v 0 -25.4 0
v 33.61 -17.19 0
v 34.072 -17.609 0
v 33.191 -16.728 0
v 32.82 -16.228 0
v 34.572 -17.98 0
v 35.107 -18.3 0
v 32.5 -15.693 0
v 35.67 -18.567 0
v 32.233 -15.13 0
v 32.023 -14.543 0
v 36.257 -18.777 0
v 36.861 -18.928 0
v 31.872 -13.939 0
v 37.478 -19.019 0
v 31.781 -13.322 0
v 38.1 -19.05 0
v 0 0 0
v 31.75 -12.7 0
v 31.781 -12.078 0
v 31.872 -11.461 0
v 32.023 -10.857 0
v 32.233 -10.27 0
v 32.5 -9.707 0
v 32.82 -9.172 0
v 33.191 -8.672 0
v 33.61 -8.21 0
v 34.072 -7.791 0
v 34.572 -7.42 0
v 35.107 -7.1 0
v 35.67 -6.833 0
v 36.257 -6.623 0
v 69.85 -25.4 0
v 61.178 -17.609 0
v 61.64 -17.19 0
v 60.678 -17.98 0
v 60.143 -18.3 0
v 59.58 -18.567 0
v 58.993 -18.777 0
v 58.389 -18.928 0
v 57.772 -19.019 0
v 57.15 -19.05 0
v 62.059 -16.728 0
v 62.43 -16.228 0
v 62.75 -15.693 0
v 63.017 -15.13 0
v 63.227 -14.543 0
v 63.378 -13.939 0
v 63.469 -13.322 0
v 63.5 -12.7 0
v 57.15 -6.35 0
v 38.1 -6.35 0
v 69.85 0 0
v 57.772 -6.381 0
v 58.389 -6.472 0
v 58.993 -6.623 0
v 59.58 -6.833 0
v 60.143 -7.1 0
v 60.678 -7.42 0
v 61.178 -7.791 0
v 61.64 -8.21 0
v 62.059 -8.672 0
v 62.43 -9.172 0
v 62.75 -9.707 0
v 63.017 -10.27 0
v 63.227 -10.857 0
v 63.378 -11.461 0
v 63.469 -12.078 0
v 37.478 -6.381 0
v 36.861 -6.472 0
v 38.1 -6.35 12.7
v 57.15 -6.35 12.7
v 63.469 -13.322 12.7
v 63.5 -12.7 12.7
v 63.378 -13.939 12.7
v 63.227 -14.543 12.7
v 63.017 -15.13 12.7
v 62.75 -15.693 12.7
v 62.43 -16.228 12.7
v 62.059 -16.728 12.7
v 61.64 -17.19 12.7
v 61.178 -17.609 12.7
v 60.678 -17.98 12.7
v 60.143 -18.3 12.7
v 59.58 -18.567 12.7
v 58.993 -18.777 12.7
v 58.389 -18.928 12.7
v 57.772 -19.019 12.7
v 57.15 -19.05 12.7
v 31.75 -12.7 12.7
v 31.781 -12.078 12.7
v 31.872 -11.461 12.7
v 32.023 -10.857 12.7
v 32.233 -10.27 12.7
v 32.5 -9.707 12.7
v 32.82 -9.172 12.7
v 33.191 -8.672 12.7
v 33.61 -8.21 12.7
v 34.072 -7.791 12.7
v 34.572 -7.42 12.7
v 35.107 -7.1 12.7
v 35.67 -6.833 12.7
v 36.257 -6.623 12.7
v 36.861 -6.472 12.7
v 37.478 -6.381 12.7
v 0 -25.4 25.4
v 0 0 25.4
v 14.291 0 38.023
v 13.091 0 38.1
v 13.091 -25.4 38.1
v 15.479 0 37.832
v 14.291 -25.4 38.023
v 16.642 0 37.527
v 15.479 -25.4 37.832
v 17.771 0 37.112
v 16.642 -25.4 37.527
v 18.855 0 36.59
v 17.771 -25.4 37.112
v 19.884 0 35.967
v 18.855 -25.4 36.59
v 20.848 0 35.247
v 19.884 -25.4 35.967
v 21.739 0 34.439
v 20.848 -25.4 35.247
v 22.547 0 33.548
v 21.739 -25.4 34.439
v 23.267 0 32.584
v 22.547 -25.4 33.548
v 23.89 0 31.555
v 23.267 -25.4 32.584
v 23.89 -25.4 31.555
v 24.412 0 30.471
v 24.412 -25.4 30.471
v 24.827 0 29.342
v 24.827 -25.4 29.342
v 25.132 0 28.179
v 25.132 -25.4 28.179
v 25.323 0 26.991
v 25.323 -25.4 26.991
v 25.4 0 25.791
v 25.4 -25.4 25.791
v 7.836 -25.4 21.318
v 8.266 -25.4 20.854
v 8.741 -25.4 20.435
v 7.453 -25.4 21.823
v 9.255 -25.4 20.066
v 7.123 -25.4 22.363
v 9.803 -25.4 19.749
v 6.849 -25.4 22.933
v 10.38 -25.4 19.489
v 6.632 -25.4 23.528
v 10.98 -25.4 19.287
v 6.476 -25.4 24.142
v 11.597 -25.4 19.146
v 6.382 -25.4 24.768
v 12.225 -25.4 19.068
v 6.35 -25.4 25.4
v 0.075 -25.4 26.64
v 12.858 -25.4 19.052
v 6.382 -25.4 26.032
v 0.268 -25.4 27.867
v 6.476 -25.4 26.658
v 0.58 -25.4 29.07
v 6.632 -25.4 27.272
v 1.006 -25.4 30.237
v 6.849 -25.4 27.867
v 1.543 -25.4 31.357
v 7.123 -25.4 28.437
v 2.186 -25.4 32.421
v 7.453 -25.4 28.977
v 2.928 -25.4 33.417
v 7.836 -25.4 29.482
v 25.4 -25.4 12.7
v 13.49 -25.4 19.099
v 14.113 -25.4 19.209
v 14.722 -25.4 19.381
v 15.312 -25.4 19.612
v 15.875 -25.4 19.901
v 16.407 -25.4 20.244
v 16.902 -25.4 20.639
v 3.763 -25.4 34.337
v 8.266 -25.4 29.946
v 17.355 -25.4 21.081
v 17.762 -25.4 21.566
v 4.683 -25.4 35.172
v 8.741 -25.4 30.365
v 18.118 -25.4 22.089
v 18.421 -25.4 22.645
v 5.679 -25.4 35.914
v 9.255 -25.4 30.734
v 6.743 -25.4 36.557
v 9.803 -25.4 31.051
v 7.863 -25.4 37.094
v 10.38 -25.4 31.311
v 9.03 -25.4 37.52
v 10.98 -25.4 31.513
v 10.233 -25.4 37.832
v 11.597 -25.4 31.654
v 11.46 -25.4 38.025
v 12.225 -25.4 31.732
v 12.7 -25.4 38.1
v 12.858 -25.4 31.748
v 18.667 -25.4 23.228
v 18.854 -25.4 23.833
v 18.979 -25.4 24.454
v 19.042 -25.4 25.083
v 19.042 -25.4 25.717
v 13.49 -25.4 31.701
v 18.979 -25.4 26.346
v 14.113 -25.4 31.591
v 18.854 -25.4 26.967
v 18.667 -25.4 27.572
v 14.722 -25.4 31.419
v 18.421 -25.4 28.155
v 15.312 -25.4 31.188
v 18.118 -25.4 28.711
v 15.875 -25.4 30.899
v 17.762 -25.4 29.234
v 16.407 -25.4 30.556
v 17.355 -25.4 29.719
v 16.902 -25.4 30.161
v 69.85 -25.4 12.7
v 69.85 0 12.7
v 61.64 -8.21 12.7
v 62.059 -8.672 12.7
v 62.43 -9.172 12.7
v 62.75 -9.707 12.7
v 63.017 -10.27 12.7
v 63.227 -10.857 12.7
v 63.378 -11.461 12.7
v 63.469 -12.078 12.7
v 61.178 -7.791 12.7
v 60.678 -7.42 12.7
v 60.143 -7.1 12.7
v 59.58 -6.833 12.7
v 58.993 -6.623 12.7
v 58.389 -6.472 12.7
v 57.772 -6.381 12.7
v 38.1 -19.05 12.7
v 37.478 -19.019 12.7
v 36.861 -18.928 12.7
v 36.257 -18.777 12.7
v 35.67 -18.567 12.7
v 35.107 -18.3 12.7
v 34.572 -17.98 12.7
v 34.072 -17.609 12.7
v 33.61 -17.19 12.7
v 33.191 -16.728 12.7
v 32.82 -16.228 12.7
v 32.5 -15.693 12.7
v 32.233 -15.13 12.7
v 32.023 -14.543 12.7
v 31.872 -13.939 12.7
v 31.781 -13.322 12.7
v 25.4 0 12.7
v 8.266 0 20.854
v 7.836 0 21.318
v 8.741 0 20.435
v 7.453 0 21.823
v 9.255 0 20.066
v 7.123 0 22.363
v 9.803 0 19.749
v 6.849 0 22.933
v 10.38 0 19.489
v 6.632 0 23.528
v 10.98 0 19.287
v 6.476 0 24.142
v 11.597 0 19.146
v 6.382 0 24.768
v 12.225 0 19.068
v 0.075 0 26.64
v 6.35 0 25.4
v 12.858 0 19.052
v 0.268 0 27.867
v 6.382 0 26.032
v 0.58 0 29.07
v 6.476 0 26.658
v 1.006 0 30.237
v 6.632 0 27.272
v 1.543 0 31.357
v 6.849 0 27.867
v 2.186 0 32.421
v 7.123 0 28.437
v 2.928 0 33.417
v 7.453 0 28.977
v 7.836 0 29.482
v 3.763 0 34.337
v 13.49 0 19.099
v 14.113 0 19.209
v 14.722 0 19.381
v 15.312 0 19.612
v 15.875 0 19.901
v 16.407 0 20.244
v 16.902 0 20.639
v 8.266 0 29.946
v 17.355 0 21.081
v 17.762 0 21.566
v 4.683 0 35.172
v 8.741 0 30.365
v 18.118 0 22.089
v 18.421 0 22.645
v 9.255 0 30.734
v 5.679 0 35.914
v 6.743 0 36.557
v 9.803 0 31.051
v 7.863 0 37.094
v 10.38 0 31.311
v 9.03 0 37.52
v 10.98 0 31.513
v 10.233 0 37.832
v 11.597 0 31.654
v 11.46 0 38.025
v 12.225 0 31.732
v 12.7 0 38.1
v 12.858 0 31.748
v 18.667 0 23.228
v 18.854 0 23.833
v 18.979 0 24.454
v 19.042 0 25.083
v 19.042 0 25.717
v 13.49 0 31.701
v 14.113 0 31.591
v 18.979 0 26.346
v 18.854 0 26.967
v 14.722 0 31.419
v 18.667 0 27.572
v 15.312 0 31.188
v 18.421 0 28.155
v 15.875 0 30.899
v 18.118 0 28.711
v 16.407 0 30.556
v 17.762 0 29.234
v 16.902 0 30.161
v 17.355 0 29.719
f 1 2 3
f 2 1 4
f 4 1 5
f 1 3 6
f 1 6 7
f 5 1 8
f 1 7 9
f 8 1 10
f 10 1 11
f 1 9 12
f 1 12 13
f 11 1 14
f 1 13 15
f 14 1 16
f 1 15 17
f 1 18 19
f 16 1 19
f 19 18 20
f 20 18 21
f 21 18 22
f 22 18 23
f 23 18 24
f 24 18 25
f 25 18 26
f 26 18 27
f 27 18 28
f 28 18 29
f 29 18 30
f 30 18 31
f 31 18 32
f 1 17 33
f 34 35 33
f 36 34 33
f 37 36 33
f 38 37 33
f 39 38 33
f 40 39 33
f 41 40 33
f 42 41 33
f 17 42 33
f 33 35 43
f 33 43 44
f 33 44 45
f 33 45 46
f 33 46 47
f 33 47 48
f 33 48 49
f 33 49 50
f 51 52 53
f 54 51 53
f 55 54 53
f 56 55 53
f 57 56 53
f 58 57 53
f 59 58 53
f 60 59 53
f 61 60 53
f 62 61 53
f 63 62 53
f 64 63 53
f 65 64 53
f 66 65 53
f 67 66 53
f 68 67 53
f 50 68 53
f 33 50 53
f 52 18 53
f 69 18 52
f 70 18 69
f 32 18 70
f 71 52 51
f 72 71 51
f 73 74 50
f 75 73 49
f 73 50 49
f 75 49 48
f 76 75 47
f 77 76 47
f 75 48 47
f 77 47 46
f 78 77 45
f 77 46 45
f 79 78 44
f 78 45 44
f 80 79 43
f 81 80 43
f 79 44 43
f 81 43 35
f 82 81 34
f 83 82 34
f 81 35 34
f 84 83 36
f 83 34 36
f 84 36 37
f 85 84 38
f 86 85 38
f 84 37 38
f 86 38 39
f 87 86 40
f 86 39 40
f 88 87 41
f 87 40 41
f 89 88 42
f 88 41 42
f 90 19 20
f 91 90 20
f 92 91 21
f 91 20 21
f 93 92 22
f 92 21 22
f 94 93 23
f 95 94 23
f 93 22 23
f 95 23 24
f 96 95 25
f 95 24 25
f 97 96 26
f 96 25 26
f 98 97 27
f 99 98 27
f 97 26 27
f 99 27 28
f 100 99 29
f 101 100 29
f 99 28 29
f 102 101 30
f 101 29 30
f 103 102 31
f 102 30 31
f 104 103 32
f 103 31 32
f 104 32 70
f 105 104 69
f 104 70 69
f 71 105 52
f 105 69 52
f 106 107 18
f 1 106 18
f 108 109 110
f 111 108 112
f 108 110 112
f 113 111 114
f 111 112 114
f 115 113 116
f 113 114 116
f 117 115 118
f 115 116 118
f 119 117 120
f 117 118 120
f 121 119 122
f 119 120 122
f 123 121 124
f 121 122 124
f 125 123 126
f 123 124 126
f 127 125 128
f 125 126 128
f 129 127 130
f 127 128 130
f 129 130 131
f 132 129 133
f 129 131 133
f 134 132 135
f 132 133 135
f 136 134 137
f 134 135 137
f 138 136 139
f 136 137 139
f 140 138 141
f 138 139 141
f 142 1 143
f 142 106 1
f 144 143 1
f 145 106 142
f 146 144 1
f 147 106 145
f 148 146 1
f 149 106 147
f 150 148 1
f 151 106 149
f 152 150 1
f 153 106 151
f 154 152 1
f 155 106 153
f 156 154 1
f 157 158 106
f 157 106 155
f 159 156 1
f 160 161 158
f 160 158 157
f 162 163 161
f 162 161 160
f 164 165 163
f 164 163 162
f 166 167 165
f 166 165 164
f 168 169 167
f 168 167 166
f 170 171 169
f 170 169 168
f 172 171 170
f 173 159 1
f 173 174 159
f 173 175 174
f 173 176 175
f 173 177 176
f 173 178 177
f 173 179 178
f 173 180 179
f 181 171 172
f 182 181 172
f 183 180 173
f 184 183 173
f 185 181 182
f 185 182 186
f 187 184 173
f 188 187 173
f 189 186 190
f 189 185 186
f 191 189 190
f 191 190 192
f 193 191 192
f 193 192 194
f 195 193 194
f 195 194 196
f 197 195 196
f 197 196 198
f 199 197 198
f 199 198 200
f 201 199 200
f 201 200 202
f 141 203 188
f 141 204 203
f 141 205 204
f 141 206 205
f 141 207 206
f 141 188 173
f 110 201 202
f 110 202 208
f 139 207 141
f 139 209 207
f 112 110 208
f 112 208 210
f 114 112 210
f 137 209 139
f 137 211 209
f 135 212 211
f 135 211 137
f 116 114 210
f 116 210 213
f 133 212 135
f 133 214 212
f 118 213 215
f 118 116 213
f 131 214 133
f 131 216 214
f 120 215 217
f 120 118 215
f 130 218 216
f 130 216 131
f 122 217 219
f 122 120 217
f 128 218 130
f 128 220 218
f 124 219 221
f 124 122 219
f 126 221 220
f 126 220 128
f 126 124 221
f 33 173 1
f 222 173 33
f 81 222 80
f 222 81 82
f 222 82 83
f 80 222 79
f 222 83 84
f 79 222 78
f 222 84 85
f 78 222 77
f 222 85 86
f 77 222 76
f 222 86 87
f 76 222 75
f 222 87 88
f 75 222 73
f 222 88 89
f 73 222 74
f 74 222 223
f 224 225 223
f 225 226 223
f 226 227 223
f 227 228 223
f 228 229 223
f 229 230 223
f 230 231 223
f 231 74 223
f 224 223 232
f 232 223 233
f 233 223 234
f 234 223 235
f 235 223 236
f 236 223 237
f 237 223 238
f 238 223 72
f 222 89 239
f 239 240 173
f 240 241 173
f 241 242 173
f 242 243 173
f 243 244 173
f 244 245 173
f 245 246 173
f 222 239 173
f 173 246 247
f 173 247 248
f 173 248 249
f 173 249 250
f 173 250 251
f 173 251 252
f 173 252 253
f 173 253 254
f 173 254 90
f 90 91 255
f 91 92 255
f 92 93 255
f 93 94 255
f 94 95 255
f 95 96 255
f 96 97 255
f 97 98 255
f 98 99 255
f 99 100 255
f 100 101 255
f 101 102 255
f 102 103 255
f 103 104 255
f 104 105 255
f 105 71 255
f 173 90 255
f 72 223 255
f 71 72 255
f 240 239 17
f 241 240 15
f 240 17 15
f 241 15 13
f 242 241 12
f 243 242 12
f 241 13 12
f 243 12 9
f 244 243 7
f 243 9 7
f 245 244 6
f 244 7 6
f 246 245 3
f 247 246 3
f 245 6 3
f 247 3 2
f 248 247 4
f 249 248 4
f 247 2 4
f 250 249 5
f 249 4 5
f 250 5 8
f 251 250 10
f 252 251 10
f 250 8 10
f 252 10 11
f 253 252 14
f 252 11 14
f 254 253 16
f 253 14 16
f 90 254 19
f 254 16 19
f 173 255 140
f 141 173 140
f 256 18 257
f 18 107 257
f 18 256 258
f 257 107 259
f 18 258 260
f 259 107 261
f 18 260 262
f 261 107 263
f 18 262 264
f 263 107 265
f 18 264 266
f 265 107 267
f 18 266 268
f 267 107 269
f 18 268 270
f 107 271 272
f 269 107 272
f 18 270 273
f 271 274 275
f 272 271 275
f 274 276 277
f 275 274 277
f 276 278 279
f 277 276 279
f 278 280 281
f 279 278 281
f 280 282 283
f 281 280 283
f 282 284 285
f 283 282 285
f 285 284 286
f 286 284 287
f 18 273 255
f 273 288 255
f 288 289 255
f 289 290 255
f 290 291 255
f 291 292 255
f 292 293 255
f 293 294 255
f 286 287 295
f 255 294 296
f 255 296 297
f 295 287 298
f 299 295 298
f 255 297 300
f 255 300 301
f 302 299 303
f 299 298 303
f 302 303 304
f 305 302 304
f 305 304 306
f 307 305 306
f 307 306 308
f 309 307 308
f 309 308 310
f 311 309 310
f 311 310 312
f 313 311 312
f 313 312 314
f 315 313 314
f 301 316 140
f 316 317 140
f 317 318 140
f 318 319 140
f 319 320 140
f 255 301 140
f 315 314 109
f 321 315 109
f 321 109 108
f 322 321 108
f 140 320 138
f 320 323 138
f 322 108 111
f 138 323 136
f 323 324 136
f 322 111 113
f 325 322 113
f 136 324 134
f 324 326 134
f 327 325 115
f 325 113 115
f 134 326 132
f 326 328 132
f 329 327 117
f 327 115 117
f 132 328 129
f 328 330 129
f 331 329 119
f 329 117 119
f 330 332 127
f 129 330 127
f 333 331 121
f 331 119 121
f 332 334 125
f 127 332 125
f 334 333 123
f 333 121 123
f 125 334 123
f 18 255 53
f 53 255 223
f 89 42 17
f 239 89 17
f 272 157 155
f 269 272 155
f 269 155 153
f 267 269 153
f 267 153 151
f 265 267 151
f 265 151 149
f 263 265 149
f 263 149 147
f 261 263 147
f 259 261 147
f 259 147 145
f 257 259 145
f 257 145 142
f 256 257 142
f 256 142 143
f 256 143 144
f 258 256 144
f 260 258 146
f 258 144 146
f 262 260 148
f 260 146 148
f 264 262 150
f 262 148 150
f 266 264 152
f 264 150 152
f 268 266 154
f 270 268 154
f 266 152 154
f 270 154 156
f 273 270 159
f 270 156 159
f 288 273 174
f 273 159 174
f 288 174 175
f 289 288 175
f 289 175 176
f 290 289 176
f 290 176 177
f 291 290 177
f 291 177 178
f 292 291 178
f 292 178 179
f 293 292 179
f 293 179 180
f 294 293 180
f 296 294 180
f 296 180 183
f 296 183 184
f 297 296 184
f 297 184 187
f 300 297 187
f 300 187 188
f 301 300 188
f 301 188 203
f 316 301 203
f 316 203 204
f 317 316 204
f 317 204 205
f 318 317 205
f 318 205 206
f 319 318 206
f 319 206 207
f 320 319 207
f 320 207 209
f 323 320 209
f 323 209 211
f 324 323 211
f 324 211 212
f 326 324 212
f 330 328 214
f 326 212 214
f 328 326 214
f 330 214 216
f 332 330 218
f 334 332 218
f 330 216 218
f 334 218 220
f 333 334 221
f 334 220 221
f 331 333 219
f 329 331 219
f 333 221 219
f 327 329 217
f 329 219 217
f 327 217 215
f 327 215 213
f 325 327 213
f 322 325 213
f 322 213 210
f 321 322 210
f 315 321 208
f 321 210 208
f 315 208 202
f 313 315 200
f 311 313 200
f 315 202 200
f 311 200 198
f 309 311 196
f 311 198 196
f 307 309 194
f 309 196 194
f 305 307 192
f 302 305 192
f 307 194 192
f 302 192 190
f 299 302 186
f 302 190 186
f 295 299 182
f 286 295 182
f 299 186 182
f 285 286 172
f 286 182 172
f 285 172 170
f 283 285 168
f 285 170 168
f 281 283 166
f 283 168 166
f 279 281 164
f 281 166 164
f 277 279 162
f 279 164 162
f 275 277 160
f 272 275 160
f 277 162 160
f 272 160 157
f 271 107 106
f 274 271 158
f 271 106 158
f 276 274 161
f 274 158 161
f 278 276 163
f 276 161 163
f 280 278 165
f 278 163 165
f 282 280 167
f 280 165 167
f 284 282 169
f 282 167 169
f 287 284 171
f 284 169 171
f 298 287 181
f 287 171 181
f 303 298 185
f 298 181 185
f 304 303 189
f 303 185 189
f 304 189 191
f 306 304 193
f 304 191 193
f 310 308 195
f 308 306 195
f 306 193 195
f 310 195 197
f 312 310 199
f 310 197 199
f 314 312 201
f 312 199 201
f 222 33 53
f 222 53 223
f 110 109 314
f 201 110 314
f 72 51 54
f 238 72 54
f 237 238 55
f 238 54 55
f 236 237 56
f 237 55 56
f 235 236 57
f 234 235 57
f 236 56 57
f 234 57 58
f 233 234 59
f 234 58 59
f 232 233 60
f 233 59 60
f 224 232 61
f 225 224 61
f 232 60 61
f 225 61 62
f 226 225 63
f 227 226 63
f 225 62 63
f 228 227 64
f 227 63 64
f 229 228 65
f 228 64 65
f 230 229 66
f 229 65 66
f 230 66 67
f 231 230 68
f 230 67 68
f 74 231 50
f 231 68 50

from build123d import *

# Parameters (mm, degrees)
F1_DEPTH = 25.4
F3_DEPTH = 25.401
F5_DEPTH = 25.401
F7_DEPTH = 38.101


with BuildPart() as f1:
    # F0 (on Front) → F1 (new body)
    with BuildSketch(Plane.XZ):
        Polygon((0, 38.1), (0, 0), (69.85, 0), (69.85, 12.7), (25.4, 12.7), (25.4, 38.1), align=None)
    extrude(amount=F1_DEPTH)

    # F2 (on face) → F3 (cut, through all)
    with BuildSketch(Plane.XZ.offset(25.4)):
        with BuildLine():
            Line((6.35, 25.4), (19.05, 25.4))
            ThreePointArc((19.05, 25.4), (12.7, 31.75), (6.35, 25.4))
        make_face()
        with BuildLine():
            ThreePointArc((6.35, 25.4), (12.7, 19.05), (19.05, 25.4))
            Line((19.05, 25.4), (6.35, 25.4))
        make_face()
    extrude(amount=-F3_DEPTH, mode=Mode.SUBTRACT)

    # F4 (on face) → F5 (cut, through all)
    with BuildSketch(Plane.XZ.offset(25.4)):
        with BuildLine():
            ThreePointArc((0, 25.4), (3.7630086547, 34.3369913453), (12.7, 38.1))
            Line((12.7, 38.1), (0, 38.1))
            Line((0, 38.1), (0, 25.4))
        make_face()
        with BuildLine():
            ThreePointArc((13.0906473624, 38.1), (21.7385437163, 34.4385437163), (25.4, 25.7906473624))
            Line((25.4, 25.7906473624), (25.4, 38.1))
            Line((25.4, 38.1), (13.0906473624, 38.1))
        make_face()
    extrude(amount=-F5_DEPTH, mode=Mode.SUBTRACT)

    # F6 (on face) → F7 (cut, through all)
    with BuildSketch(Plane(origin=(0, 0, 0), x_dir=(1, 0, 0), z_dir=(0, 0, -1))):
        with BuildLine():
            Line((38.1, 6.35), (57.15, 6.35))
            ThreePointArc((57.15, 6.35), (61.6401280605, 8.2098719395), (63.5, 12.7))
            ThreePointArc((63.5, 12.7), (61.6401280605, 17.1901280605), (57.15, 19.05))
            Line((57.15, 19.05), (38.1, 19.05))
            ThreePointArc((38.1, 19.05), (33.6098719395, 17.1901280605), (31.75, 12.7))
            ThreePointArc((31.75, 12.7), (33.6098719395, 8.2098719395), (38.1, 6.35))
        make_face()
    extrude(amount=-F7_DEPTH, mode=Mode.SUBTRACT)


solid = f1.part
